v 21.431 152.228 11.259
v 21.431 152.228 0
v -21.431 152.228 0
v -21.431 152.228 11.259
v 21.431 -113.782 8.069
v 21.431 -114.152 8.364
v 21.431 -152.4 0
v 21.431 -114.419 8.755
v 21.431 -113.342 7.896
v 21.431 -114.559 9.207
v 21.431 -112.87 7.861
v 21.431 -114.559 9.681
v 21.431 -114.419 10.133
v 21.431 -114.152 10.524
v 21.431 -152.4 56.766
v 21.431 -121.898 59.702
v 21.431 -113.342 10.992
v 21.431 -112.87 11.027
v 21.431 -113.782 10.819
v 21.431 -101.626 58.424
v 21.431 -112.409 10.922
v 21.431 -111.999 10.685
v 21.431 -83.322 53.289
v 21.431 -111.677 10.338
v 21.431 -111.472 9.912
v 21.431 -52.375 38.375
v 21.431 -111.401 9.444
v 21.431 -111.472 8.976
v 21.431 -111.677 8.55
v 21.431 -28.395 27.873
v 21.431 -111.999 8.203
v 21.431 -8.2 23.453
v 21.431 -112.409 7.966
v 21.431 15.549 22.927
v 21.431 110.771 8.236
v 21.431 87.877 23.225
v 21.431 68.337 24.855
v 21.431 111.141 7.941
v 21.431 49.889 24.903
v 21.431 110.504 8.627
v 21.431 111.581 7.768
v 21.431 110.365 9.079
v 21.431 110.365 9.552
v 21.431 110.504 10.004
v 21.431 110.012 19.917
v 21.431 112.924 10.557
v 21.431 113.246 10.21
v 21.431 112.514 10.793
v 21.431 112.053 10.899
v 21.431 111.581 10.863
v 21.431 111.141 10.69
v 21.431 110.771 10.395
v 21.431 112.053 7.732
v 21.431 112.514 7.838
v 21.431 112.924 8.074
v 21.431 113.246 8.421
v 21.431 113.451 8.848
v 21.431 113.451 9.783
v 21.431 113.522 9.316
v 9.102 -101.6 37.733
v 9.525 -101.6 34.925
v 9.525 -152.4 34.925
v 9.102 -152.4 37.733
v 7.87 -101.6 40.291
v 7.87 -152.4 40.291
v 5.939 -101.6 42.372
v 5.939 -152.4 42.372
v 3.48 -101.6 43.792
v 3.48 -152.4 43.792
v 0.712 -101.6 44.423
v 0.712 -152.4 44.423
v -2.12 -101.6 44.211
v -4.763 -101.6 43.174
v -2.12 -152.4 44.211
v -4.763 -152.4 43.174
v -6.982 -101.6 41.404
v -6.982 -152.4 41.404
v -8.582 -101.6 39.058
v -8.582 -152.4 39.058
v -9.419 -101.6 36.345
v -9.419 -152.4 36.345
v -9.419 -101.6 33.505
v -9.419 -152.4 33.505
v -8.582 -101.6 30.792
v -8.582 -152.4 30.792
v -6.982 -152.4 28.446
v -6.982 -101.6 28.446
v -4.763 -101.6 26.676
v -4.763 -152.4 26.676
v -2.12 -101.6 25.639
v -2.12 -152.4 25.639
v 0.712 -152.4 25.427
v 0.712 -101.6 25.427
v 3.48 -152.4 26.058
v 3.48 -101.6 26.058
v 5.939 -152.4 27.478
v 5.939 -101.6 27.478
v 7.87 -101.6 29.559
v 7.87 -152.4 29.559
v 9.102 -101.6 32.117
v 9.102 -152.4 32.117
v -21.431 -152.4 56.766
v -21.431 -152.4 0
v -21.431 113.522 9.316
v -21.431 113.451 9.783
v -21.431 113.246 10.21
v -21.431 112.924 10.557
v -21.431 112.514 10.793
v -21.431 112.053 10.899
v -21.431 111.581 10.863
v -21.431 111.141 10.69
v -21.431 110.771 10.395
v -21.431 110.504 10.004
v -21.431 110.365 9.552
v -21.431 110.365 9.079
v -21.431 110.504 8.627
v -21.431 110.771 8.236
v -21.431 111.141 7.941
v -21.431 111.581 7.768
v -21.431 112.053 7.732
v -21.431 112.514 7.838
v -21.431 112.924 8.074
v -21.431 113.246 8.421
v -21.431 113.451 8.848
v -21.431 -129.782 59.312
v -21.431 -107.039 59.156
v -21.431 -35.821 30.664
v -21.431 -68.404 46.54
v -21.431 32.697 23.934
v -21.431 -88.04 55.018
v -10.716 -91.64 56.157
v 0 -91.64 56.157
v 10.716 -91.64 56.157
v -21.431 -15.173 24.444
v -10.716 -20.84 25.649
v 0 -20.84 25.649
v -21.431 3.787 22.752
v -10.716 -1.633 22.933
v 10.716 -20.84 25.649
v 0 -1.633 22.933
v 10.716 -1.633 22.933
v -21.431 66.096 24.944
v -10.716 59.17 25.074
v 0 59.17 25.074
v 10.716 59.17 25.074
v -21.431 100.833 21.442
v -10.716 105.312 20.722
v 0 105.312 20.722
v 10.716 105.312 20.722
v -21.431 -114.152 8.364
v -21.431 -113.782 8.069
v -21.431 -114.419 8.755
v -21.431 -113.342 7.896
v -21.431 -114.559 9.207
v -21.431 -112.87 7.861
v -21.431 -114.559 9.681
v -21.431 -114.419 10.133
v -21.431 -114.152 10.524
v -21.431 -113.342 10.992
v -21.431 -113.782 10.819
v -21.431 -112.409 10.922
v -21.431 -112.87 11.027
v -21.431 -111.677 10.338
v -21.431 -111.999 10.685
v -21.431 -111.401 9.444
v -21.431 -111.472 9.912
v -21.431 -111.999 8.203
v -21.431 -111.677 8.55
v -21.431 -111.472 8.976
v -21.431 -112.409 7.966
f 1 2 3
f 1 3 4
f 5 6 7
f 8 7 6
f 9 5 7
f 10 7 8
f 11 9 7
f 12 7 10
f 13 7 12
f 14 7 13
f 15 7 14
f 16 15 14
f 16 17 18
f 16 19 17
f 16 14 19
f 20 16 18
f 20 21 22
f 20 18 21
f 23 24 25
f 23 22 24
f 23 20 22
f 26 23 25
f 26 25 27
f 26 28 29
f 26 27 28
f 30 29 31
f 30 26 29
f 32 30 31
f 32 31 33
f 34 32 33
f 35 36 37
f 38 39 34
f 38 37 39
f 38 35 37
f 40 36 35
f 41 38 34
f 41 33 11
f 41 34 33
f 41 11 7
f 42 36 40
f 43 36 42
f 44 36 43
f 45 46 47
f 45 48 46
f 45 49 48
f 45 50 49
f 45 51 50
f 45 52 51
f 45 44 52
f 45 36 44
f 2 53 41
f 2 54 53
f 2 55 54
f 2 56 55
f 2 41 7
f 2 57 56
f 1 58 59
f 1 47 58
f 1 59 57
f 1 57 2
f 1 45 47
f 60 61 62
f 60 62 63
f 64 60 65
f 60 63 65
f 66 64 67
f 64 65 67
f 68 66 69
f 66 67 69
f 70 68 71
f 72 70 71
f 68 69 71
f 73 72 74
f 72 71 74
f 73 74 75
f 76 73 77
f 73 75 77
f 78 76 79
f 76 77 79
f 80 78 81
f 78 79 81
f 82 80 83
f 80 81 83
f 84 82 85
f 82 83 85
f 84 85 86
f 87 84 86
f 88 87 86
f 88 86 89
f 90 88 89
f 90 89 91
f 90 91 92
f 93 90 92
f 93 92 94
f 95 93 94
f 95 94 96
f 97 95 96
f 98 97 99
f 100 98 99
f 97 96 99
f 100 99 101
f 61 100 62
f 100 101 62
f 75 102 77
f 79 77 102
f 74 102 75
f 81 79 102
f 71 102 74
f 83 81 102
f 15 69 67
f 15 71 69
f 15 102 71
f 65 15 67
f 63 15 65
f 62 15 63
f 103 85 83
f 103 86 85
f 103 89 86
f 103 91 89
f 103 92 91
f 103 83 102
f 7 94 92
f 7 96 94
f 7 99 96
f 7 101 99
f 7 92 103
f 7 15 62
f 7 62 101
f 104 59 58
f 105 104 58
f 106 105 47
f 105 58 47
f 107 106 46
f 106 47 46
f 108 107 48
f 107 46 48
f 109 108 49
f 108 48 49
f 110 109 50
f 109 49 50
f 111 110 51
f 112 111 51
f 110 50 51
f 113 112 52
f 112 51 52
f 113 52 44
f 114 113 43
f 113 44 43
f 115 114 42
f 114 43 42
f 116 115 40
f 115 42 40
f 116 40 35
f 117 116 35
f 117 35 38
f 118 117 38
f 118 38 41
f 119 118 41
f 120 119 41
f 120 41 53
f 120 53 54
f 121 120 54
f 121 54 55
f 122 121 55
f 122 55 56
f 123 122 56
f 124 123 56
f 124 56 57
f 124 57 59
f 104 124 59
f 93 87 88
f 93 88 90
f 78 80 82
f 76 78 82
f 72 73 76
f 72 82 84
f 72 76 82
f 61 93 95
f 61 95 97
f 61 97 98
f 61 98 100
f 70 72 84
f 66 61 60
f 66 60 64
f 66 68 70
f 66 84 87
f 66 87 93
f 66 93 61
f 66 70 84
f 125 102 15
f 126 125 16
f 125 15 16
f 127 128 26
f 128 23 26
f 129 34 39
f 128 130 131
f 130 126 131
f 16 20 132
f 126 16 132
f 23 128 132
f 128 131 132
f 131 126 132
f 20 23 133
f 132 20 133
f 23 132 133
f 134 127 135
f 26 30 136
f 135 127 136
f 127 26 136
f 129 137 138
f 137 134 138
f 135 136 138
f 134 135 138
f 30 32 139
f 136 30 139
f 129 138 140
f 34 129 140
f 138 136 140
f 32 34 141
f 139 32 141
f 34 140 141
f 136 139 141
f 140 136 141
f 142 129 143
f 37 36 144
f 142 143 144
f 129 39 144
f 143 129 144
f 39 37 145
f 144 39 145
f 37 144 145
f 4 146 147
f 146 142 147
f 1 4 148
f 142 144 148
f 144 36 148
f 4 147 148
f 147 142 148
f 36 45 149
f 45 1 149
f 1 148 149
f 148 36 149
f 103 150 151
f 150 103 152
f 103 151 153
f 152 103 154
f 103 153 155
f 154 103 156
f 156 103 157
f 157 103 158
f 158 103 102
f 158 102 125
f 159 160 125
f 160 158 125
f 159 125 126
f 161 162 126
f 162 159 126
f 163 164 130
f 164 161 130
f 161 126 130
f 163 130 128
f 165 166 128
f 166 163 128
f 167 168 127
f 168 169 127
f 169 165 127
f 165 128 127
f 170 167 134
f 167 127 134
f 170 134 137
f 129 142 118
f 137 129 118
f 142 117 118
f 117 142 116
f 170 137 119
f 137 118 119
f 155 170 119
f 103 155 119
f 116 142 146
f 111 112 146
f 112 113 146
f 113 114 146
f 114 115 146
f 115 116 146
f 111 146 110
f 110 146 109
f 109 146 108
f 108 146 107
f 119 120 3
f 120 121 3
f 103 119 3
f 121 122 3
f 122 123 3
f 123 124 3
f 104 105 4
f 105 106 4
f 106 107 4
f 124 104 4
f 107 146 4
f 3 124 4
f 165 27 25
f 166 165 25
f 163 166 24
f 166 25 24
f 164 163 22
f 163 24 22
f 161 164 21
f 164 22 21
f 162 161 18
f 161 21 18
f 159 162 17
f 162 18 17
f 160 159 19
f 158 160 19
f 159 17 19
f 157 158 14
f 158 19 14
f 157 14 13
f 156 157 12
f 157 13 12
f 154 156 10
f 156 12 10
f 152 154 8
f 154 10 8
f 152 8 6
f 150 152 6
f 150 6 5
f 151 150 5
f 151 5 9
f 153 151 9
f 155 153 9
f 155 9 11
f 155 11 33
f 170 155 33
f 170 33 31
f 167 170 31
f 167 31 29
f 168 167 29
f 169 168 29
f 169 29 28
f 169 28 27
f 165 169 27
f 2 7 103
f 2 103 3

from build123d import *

# Parameters (mm, degrees)
F1_DEPTH = 21.43125
F2_R     = 9.525
F3_DEPTH = 50.8
F5_R     = 1.5875
F6_DEPTH = 42.8635


with BuildPart() as f1:
    # F0 (on Right) → F1 (new body, symmetric)
    with BuildSketch(Plane.YZ):
        Polygon((-152.4, 69.85), (-152.4, 0), (152.4, 0), (152.4, 19.05), align=None)
    extrude(amount=F1_DEPTH, both=True)

    # F2 (on face) → F3 (cut)
    with BuildSketch(Plane.XZ.offset(152.4)):
        with Locations((0, 34.925)):
            Circle(F2_R)
    extrude(amount=-F3_DEPTH, mode=Mode.SUBTRACT)

    # F5 (on face) → F6 (intersect, through all)
    with BuildSketch(Plane.YZ.offset(21.43125)):
        with BuildLine():
            add(Edge.make_bspline(
                [(-152.655094862, 56.7322559655), (-132.3676890025, 59.4289773932), (-89.2410218232, 65.1613597048), (-22.0359245092, 13.7816198384), (60.4108187674, 31.3446624512), (120.9237045217, 18.1393091317), (152.2278054019, 11.2589439377)],
                knots=[0, 0, 0, 0, 0.2216874912, 0.470872617, 0.7247310668, 1, 1, 1, 1], degree=3))
            Line((-152.655094862, 56.7322559655), (-152.4784472605, 0))
            add(Edge.make_bspline(
                [(152.2278054019, 0), (50.7752332916, -0.6741153582), (-50.9689694069, -0.1745952019), (-152.4784472605, 0)],
                knots=[0, 0, 0, 0, 304.7062526624, 304.7062526624, 304.7062526624, 304.7062526624], degree=3))
            Line((152.2278054019, 0), (152.2278054019, 11.2589439377))
        make_face()
        with Locations((-112.9887476563, 9.443979038)):
            Circle(F5_R, mode=Mode.SUBTRACT)
        with Locations((111.9343732924, 9.3155516815)):
            Circle(F5_R, mode=Mode.SUBTRACT)
    extrude(amount=-F6_DEPTH, mode=Mode.INTERSECT)


solid = f1.part
